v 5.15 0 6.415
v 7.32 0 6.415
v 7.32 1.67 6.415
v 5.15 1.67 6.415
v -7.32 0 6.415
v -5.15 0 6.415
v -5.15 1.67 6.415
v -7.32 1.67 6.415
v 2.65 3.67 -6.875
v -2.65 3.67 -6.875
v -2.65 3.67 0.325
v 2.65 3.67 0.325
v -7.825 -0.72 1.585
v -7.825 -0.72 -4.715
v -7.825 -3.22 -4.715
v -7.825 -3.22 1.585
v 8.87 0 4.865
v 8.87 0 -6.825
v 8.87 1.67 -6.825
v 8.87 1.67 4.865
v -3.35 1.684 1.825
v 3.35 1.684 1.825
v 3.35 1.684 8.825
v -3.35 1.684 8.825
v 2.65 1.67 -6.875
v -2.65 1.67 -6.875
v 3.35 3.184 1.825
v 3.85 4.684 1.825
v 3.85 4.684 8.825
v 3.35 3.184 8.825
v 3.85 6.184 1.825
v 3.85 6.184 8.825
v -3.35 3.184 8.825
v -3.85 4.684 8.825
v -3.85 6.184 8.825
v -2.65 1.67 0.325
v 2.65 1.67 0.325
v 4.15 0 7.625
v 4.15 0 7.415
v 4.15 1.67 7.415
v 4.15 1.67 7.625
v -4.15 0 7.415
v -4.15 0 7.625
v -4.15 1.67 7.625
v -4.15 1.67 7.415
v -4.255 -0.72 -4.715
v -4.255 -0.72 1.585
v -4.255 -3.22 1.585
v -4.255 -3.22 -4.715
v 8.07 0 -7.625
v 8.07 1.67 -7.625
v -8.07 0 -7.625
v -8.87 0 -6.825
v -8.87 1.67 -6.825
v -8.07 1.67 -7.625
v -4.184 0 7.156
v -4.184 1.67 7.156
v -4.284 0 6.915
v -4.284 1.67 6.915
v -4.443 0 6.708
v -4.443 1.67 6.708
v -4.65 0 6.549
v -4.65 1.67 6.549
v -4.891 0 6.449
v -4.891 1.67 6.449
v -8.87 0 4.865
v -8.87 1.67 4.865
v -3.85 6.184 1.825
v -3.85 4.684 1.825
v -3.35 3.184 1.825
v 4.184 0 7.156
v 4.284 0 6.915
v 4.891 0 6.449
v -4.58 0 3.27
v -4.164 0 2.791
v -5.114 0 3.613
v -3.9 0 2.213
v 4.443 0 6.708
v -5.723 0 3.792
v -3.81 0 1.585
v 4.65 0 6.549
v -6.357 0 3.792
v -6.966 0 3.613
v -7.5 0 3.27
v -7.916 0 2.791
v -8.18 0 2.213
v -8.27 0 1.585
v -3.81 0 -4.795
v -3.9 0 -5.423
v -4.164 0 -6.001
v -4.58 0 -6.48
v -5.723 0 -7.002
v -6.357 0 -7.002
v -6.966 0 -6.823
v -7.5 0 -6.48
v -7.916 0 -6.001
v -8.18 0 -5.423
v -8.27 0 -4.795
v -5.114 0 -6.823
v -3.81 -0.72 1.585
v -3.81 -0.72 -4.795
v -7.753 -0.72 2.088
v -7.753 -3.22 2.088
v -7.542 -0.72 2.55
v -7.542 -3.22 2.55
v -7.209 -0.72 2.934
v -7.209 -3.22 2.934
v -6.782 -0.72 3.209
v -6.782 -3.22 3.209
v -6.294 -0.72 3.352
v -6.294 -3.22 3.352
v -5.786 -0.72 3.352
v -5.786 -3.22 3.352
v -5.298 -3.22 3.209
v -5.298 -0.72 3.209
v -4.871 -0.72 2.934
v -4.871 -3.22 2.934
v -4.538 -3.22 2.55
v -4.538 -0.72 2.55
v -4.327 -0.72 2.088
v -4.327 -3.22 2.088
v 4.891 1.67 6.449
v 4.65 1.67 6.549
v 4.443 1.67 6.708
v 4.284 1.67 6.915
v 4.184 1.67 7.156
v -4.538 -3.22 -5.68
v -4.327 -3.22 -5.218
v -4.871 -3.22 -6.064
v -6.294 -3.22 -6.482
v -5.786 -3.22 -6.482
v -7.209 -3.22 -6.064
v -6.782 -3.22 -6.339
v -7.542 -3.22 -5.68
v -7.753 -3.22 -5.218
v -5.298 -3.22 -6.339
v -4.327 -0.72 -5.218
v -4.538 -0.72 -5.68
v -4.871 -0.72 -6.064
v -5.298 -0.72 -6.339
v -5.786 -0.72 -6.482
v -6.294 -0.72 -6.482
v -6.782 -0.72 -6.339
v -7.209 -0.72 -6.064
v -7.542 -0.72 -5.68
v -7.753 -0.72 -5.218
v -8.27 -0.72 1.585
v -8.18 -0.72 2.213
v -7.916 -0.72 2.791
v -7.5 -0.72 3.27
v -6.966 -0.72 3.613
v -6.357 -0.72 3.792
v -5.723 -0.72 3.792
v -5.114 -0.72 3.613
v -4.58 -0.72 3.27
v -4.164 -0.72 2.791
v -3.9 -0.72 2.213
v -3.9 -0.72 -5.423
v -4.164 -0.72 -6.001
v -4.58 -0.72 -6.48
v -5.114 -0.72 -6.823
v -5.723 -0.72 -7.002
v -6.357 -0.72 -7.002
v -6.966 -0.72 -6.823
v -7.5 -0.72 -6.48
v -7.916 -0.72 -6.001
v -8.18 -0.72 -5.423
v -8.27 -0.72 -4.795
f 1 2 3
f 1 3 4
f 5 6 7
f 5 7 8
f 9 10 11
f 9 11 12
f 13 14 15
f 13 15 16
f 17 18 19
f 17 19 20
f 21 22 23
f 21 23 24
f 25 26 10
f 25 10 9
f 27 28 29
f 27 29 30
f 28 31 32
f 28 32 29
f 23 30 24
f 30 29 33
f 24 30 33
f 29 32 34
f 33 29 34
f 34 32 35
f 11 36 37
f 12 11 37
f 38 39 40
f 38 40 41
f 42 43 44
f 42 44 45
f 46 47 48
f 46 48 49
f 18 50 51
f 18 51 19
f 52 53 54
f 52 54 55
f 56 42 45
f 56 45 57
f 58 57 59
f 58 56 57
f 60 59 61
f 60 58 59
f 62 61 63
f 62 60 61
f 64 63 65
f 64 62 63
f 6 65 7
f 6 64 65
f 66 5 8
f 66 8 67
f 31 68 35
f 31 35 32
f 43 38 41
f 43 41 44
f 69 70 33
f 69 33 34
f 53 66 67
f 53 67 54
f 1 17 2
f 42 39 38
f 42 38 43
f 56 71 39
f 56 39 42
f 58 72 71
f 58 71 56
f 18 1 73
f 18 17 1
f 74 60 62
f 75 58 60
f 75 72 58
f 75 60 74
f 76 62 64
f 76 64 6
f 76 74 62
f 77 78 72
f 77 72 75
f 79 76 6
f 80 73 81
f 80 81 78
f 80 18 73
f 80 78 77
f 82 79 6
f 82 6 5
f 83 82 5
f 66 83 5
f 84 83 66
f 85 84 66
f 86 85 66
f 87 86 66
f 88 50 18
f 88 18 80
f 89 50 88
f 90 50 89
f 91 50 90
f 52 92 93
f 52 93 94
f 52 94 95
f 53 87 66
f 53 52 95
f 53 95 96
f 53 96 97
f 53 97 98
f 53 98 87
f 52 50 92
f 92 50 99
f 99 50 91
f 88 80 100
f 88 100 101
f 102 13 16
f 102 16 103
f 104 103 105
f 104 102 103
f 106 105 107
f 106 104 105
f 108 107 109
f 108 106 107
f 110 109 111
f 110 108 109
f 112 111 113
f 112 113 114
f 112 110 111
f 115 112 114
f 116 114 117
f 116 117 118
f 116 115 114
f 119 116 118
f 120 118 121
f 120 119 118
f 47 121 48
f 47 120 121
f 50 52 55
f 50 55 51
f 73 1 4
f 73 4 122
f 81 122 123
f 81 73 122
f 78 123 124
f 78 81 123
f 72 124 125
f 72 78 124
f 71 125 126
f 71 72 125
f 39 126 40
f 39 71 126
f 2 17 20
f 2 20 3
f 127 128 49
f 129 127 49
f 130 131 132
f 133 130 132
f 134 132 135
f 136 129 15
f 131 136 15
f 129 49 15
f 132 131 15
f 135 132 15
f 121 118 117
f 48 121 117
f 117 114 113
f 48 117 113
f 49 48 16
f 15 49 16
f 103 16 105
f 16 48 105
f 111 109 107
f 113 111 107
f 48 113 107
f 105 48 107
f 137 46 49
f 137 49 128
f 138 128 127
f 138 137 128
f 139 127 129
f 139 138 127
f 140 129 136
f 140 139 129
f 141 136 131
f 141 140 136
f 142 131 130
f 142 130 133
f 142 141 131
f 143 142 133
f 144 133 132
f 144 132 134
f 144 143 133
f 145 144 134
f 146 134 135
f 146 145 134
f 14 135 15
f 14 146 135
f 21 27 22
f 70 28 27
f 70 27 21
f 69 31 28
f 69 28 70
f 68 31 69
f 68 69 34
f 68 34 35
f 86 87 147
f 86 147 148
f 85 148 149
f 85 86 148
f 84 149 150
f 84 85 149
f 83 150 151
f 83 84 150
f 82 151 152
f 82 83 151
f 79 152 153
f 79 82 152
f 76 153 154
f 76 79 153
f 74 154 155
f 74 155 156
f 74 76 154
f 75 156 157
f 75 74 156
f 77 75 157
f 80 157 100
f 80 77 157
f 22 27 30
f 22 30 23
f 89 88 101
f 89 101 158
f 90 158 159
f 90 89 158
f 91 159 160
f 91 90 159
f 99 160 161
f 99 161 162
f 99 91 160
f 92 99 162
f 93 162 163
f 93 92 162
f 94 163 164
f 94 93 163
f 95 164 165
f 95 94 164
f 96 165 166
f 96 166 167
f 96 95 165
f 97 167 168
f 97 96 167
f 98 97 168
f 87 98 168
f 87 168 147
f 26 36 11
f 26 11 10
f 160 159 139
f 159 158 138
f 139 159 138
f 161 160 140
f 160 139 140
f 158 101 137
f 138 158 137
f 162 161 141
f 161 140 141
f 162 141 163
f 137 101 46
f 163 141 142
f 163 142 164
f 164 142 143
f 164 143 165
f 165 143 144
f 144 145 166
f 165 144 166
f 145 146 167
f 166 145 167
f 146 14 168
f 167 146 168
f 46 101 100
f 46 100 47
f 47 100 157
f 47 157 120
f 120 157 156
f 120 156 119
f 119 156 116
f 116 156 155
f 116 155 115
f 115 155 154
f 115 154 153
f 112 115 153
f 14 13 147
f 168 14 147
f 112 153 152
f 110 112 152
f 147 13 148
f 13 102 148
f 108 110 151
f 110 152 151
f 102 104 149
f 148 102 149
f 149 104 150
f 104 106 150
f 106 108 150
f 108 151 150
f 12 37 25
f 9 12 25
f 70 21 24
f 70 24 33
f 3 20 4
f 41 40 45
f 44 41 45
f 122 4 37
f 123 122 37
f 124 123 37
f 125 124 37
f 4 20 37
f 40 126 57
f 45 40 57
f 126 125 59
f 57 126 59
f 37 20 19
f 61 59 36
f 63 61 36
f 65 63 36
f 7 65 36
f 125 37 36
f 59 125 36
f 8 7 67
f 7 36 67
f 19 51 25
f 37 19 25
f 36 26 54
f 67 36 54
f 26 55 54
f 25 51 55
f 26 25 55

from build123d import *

# Parameters (mm, degrees)
PCB_DEPTH           = 1.67
SKETCH2_W           = 5.3
SKETCH2_H           = 7.2
PIC18_DEPTH         = 2
CRYSTAL_DEPTH       = 0.72
BOSS_EXTRUDE4_DEPTH = 2.5
USB_CONNECTOR_DEPTH = 7


with BuildPart() as part:
    # PCB Sketch → PCB (new body)
    with BuildSketch(Plane(origin=(0, 0, 0), x_dir=(1, 0, 0), z_dir=(0, 1, 0))):
        with BuildLine():
            Line((-8.07, 7.625), (8.07, 7.625))
            Line((8.07, 7.625), (8.87, 6.825))
            Line((8.87, 6.825), (8.87, -4.865))
            Line((8.87, -4.865), (7.32, -6.415))
            Line((7.32, -6.415), (5.15, -6.415))
            ThreePointArc((5.15, -6.415), (4.442893219, -6.707893219), (4.15, -7.415))
            Line((4.15, -7.415), (4.15, -7.625))
            Line((4.15, -7.625), (-4.15, -7.625))
            Line((-4.15, -7.625), (-4.15, -7.415))
            ThreePointArc((-4.15, -7.415), (-4.442893219, -6.707893219), (-5.15, -6.415))
            Line((-5.15, -6.415), (-7.32, -6.415))
            Line((-7.32, -6.415), (-8.87, -4.865))
            Line((-8.87, -4.865), (-8.87, 6.825))
            Line((-8.87, 6.825), (-8.07, 7.625))
        make_face()
    extrude(amount=PCB_DEPTH)

    # Sketch2 → PIC18 (add)
    with BuildSketch(Plane(origin=(0, 1.67, 0), x_dir=(1, 0, 0), z_dir=(0, 1, 0))):
        with Locations((0, 3.275)):
            Rectangle(SKETCH2_W, SKETCH2_H)
    extrude(amount=PIC18_DEPTH)

    # Sketch3 → Crystal (add)
    with BuildSketch(Plane.XZ):
        with BuildLine():
            Line((-3.81, 1.585), (-3.81, -4.795))
            ThreePointArc((-3.81, -4.795), (-6.04, -7.025), (-8.27, -4.795))
            Line((-8.27, -4.795), (-8.27, 1.585))
            ThreePointArc((-8.27, 1.585), (-6.04, 3.815), (-3.81, 1.585))
        make_face()
    extrude(amount=CRYSTAL_DEPTH)

    # Sketch5 → Boss-Extrude4 (add)
    with BuildSketch(Plane.XZ.offset(0.72)):
        with BuildLine():
            Line((-4.255, 1.585), (-4.255, -4.715))
            ThreePointArc((-4.255, -4.715), (-6.04, -6.5), (-7.825, -4.715))
            Line((-7.825, -4.715), (-7.825, 1.585))
            ThreePointArc((-7.825, 1.585), (-6.04, 3.37), (-4.255, 1.585))
        make_face()
    extrude(amount=BOSS_EXTRUDE4_DEPTH)


with BuildPart() as body_2:
    # 3DSketch1 → USB Connector (new body)
    with BuildSketch(Plane(origin=(-3.849621322, 6.184444439, 1.825), x_dir=(0.847998304005088, -0.52999894000318, 0), z_dir=(0, 0, 1))):
        Polygon((0, 0), (6.529586941, 4.080991838), (7.324585351, 2.808994382), (7.695584609, 1.271997456), (8.490583019, 0), (2.808994382, -3.550992898), (2.013995972, -2.278995442), (0.79499841, -1.271997456), align=None)
    extrude(amount=USB_CONNECTOR_DEPTH)


solid = Compound([part.part, body_2.part])
